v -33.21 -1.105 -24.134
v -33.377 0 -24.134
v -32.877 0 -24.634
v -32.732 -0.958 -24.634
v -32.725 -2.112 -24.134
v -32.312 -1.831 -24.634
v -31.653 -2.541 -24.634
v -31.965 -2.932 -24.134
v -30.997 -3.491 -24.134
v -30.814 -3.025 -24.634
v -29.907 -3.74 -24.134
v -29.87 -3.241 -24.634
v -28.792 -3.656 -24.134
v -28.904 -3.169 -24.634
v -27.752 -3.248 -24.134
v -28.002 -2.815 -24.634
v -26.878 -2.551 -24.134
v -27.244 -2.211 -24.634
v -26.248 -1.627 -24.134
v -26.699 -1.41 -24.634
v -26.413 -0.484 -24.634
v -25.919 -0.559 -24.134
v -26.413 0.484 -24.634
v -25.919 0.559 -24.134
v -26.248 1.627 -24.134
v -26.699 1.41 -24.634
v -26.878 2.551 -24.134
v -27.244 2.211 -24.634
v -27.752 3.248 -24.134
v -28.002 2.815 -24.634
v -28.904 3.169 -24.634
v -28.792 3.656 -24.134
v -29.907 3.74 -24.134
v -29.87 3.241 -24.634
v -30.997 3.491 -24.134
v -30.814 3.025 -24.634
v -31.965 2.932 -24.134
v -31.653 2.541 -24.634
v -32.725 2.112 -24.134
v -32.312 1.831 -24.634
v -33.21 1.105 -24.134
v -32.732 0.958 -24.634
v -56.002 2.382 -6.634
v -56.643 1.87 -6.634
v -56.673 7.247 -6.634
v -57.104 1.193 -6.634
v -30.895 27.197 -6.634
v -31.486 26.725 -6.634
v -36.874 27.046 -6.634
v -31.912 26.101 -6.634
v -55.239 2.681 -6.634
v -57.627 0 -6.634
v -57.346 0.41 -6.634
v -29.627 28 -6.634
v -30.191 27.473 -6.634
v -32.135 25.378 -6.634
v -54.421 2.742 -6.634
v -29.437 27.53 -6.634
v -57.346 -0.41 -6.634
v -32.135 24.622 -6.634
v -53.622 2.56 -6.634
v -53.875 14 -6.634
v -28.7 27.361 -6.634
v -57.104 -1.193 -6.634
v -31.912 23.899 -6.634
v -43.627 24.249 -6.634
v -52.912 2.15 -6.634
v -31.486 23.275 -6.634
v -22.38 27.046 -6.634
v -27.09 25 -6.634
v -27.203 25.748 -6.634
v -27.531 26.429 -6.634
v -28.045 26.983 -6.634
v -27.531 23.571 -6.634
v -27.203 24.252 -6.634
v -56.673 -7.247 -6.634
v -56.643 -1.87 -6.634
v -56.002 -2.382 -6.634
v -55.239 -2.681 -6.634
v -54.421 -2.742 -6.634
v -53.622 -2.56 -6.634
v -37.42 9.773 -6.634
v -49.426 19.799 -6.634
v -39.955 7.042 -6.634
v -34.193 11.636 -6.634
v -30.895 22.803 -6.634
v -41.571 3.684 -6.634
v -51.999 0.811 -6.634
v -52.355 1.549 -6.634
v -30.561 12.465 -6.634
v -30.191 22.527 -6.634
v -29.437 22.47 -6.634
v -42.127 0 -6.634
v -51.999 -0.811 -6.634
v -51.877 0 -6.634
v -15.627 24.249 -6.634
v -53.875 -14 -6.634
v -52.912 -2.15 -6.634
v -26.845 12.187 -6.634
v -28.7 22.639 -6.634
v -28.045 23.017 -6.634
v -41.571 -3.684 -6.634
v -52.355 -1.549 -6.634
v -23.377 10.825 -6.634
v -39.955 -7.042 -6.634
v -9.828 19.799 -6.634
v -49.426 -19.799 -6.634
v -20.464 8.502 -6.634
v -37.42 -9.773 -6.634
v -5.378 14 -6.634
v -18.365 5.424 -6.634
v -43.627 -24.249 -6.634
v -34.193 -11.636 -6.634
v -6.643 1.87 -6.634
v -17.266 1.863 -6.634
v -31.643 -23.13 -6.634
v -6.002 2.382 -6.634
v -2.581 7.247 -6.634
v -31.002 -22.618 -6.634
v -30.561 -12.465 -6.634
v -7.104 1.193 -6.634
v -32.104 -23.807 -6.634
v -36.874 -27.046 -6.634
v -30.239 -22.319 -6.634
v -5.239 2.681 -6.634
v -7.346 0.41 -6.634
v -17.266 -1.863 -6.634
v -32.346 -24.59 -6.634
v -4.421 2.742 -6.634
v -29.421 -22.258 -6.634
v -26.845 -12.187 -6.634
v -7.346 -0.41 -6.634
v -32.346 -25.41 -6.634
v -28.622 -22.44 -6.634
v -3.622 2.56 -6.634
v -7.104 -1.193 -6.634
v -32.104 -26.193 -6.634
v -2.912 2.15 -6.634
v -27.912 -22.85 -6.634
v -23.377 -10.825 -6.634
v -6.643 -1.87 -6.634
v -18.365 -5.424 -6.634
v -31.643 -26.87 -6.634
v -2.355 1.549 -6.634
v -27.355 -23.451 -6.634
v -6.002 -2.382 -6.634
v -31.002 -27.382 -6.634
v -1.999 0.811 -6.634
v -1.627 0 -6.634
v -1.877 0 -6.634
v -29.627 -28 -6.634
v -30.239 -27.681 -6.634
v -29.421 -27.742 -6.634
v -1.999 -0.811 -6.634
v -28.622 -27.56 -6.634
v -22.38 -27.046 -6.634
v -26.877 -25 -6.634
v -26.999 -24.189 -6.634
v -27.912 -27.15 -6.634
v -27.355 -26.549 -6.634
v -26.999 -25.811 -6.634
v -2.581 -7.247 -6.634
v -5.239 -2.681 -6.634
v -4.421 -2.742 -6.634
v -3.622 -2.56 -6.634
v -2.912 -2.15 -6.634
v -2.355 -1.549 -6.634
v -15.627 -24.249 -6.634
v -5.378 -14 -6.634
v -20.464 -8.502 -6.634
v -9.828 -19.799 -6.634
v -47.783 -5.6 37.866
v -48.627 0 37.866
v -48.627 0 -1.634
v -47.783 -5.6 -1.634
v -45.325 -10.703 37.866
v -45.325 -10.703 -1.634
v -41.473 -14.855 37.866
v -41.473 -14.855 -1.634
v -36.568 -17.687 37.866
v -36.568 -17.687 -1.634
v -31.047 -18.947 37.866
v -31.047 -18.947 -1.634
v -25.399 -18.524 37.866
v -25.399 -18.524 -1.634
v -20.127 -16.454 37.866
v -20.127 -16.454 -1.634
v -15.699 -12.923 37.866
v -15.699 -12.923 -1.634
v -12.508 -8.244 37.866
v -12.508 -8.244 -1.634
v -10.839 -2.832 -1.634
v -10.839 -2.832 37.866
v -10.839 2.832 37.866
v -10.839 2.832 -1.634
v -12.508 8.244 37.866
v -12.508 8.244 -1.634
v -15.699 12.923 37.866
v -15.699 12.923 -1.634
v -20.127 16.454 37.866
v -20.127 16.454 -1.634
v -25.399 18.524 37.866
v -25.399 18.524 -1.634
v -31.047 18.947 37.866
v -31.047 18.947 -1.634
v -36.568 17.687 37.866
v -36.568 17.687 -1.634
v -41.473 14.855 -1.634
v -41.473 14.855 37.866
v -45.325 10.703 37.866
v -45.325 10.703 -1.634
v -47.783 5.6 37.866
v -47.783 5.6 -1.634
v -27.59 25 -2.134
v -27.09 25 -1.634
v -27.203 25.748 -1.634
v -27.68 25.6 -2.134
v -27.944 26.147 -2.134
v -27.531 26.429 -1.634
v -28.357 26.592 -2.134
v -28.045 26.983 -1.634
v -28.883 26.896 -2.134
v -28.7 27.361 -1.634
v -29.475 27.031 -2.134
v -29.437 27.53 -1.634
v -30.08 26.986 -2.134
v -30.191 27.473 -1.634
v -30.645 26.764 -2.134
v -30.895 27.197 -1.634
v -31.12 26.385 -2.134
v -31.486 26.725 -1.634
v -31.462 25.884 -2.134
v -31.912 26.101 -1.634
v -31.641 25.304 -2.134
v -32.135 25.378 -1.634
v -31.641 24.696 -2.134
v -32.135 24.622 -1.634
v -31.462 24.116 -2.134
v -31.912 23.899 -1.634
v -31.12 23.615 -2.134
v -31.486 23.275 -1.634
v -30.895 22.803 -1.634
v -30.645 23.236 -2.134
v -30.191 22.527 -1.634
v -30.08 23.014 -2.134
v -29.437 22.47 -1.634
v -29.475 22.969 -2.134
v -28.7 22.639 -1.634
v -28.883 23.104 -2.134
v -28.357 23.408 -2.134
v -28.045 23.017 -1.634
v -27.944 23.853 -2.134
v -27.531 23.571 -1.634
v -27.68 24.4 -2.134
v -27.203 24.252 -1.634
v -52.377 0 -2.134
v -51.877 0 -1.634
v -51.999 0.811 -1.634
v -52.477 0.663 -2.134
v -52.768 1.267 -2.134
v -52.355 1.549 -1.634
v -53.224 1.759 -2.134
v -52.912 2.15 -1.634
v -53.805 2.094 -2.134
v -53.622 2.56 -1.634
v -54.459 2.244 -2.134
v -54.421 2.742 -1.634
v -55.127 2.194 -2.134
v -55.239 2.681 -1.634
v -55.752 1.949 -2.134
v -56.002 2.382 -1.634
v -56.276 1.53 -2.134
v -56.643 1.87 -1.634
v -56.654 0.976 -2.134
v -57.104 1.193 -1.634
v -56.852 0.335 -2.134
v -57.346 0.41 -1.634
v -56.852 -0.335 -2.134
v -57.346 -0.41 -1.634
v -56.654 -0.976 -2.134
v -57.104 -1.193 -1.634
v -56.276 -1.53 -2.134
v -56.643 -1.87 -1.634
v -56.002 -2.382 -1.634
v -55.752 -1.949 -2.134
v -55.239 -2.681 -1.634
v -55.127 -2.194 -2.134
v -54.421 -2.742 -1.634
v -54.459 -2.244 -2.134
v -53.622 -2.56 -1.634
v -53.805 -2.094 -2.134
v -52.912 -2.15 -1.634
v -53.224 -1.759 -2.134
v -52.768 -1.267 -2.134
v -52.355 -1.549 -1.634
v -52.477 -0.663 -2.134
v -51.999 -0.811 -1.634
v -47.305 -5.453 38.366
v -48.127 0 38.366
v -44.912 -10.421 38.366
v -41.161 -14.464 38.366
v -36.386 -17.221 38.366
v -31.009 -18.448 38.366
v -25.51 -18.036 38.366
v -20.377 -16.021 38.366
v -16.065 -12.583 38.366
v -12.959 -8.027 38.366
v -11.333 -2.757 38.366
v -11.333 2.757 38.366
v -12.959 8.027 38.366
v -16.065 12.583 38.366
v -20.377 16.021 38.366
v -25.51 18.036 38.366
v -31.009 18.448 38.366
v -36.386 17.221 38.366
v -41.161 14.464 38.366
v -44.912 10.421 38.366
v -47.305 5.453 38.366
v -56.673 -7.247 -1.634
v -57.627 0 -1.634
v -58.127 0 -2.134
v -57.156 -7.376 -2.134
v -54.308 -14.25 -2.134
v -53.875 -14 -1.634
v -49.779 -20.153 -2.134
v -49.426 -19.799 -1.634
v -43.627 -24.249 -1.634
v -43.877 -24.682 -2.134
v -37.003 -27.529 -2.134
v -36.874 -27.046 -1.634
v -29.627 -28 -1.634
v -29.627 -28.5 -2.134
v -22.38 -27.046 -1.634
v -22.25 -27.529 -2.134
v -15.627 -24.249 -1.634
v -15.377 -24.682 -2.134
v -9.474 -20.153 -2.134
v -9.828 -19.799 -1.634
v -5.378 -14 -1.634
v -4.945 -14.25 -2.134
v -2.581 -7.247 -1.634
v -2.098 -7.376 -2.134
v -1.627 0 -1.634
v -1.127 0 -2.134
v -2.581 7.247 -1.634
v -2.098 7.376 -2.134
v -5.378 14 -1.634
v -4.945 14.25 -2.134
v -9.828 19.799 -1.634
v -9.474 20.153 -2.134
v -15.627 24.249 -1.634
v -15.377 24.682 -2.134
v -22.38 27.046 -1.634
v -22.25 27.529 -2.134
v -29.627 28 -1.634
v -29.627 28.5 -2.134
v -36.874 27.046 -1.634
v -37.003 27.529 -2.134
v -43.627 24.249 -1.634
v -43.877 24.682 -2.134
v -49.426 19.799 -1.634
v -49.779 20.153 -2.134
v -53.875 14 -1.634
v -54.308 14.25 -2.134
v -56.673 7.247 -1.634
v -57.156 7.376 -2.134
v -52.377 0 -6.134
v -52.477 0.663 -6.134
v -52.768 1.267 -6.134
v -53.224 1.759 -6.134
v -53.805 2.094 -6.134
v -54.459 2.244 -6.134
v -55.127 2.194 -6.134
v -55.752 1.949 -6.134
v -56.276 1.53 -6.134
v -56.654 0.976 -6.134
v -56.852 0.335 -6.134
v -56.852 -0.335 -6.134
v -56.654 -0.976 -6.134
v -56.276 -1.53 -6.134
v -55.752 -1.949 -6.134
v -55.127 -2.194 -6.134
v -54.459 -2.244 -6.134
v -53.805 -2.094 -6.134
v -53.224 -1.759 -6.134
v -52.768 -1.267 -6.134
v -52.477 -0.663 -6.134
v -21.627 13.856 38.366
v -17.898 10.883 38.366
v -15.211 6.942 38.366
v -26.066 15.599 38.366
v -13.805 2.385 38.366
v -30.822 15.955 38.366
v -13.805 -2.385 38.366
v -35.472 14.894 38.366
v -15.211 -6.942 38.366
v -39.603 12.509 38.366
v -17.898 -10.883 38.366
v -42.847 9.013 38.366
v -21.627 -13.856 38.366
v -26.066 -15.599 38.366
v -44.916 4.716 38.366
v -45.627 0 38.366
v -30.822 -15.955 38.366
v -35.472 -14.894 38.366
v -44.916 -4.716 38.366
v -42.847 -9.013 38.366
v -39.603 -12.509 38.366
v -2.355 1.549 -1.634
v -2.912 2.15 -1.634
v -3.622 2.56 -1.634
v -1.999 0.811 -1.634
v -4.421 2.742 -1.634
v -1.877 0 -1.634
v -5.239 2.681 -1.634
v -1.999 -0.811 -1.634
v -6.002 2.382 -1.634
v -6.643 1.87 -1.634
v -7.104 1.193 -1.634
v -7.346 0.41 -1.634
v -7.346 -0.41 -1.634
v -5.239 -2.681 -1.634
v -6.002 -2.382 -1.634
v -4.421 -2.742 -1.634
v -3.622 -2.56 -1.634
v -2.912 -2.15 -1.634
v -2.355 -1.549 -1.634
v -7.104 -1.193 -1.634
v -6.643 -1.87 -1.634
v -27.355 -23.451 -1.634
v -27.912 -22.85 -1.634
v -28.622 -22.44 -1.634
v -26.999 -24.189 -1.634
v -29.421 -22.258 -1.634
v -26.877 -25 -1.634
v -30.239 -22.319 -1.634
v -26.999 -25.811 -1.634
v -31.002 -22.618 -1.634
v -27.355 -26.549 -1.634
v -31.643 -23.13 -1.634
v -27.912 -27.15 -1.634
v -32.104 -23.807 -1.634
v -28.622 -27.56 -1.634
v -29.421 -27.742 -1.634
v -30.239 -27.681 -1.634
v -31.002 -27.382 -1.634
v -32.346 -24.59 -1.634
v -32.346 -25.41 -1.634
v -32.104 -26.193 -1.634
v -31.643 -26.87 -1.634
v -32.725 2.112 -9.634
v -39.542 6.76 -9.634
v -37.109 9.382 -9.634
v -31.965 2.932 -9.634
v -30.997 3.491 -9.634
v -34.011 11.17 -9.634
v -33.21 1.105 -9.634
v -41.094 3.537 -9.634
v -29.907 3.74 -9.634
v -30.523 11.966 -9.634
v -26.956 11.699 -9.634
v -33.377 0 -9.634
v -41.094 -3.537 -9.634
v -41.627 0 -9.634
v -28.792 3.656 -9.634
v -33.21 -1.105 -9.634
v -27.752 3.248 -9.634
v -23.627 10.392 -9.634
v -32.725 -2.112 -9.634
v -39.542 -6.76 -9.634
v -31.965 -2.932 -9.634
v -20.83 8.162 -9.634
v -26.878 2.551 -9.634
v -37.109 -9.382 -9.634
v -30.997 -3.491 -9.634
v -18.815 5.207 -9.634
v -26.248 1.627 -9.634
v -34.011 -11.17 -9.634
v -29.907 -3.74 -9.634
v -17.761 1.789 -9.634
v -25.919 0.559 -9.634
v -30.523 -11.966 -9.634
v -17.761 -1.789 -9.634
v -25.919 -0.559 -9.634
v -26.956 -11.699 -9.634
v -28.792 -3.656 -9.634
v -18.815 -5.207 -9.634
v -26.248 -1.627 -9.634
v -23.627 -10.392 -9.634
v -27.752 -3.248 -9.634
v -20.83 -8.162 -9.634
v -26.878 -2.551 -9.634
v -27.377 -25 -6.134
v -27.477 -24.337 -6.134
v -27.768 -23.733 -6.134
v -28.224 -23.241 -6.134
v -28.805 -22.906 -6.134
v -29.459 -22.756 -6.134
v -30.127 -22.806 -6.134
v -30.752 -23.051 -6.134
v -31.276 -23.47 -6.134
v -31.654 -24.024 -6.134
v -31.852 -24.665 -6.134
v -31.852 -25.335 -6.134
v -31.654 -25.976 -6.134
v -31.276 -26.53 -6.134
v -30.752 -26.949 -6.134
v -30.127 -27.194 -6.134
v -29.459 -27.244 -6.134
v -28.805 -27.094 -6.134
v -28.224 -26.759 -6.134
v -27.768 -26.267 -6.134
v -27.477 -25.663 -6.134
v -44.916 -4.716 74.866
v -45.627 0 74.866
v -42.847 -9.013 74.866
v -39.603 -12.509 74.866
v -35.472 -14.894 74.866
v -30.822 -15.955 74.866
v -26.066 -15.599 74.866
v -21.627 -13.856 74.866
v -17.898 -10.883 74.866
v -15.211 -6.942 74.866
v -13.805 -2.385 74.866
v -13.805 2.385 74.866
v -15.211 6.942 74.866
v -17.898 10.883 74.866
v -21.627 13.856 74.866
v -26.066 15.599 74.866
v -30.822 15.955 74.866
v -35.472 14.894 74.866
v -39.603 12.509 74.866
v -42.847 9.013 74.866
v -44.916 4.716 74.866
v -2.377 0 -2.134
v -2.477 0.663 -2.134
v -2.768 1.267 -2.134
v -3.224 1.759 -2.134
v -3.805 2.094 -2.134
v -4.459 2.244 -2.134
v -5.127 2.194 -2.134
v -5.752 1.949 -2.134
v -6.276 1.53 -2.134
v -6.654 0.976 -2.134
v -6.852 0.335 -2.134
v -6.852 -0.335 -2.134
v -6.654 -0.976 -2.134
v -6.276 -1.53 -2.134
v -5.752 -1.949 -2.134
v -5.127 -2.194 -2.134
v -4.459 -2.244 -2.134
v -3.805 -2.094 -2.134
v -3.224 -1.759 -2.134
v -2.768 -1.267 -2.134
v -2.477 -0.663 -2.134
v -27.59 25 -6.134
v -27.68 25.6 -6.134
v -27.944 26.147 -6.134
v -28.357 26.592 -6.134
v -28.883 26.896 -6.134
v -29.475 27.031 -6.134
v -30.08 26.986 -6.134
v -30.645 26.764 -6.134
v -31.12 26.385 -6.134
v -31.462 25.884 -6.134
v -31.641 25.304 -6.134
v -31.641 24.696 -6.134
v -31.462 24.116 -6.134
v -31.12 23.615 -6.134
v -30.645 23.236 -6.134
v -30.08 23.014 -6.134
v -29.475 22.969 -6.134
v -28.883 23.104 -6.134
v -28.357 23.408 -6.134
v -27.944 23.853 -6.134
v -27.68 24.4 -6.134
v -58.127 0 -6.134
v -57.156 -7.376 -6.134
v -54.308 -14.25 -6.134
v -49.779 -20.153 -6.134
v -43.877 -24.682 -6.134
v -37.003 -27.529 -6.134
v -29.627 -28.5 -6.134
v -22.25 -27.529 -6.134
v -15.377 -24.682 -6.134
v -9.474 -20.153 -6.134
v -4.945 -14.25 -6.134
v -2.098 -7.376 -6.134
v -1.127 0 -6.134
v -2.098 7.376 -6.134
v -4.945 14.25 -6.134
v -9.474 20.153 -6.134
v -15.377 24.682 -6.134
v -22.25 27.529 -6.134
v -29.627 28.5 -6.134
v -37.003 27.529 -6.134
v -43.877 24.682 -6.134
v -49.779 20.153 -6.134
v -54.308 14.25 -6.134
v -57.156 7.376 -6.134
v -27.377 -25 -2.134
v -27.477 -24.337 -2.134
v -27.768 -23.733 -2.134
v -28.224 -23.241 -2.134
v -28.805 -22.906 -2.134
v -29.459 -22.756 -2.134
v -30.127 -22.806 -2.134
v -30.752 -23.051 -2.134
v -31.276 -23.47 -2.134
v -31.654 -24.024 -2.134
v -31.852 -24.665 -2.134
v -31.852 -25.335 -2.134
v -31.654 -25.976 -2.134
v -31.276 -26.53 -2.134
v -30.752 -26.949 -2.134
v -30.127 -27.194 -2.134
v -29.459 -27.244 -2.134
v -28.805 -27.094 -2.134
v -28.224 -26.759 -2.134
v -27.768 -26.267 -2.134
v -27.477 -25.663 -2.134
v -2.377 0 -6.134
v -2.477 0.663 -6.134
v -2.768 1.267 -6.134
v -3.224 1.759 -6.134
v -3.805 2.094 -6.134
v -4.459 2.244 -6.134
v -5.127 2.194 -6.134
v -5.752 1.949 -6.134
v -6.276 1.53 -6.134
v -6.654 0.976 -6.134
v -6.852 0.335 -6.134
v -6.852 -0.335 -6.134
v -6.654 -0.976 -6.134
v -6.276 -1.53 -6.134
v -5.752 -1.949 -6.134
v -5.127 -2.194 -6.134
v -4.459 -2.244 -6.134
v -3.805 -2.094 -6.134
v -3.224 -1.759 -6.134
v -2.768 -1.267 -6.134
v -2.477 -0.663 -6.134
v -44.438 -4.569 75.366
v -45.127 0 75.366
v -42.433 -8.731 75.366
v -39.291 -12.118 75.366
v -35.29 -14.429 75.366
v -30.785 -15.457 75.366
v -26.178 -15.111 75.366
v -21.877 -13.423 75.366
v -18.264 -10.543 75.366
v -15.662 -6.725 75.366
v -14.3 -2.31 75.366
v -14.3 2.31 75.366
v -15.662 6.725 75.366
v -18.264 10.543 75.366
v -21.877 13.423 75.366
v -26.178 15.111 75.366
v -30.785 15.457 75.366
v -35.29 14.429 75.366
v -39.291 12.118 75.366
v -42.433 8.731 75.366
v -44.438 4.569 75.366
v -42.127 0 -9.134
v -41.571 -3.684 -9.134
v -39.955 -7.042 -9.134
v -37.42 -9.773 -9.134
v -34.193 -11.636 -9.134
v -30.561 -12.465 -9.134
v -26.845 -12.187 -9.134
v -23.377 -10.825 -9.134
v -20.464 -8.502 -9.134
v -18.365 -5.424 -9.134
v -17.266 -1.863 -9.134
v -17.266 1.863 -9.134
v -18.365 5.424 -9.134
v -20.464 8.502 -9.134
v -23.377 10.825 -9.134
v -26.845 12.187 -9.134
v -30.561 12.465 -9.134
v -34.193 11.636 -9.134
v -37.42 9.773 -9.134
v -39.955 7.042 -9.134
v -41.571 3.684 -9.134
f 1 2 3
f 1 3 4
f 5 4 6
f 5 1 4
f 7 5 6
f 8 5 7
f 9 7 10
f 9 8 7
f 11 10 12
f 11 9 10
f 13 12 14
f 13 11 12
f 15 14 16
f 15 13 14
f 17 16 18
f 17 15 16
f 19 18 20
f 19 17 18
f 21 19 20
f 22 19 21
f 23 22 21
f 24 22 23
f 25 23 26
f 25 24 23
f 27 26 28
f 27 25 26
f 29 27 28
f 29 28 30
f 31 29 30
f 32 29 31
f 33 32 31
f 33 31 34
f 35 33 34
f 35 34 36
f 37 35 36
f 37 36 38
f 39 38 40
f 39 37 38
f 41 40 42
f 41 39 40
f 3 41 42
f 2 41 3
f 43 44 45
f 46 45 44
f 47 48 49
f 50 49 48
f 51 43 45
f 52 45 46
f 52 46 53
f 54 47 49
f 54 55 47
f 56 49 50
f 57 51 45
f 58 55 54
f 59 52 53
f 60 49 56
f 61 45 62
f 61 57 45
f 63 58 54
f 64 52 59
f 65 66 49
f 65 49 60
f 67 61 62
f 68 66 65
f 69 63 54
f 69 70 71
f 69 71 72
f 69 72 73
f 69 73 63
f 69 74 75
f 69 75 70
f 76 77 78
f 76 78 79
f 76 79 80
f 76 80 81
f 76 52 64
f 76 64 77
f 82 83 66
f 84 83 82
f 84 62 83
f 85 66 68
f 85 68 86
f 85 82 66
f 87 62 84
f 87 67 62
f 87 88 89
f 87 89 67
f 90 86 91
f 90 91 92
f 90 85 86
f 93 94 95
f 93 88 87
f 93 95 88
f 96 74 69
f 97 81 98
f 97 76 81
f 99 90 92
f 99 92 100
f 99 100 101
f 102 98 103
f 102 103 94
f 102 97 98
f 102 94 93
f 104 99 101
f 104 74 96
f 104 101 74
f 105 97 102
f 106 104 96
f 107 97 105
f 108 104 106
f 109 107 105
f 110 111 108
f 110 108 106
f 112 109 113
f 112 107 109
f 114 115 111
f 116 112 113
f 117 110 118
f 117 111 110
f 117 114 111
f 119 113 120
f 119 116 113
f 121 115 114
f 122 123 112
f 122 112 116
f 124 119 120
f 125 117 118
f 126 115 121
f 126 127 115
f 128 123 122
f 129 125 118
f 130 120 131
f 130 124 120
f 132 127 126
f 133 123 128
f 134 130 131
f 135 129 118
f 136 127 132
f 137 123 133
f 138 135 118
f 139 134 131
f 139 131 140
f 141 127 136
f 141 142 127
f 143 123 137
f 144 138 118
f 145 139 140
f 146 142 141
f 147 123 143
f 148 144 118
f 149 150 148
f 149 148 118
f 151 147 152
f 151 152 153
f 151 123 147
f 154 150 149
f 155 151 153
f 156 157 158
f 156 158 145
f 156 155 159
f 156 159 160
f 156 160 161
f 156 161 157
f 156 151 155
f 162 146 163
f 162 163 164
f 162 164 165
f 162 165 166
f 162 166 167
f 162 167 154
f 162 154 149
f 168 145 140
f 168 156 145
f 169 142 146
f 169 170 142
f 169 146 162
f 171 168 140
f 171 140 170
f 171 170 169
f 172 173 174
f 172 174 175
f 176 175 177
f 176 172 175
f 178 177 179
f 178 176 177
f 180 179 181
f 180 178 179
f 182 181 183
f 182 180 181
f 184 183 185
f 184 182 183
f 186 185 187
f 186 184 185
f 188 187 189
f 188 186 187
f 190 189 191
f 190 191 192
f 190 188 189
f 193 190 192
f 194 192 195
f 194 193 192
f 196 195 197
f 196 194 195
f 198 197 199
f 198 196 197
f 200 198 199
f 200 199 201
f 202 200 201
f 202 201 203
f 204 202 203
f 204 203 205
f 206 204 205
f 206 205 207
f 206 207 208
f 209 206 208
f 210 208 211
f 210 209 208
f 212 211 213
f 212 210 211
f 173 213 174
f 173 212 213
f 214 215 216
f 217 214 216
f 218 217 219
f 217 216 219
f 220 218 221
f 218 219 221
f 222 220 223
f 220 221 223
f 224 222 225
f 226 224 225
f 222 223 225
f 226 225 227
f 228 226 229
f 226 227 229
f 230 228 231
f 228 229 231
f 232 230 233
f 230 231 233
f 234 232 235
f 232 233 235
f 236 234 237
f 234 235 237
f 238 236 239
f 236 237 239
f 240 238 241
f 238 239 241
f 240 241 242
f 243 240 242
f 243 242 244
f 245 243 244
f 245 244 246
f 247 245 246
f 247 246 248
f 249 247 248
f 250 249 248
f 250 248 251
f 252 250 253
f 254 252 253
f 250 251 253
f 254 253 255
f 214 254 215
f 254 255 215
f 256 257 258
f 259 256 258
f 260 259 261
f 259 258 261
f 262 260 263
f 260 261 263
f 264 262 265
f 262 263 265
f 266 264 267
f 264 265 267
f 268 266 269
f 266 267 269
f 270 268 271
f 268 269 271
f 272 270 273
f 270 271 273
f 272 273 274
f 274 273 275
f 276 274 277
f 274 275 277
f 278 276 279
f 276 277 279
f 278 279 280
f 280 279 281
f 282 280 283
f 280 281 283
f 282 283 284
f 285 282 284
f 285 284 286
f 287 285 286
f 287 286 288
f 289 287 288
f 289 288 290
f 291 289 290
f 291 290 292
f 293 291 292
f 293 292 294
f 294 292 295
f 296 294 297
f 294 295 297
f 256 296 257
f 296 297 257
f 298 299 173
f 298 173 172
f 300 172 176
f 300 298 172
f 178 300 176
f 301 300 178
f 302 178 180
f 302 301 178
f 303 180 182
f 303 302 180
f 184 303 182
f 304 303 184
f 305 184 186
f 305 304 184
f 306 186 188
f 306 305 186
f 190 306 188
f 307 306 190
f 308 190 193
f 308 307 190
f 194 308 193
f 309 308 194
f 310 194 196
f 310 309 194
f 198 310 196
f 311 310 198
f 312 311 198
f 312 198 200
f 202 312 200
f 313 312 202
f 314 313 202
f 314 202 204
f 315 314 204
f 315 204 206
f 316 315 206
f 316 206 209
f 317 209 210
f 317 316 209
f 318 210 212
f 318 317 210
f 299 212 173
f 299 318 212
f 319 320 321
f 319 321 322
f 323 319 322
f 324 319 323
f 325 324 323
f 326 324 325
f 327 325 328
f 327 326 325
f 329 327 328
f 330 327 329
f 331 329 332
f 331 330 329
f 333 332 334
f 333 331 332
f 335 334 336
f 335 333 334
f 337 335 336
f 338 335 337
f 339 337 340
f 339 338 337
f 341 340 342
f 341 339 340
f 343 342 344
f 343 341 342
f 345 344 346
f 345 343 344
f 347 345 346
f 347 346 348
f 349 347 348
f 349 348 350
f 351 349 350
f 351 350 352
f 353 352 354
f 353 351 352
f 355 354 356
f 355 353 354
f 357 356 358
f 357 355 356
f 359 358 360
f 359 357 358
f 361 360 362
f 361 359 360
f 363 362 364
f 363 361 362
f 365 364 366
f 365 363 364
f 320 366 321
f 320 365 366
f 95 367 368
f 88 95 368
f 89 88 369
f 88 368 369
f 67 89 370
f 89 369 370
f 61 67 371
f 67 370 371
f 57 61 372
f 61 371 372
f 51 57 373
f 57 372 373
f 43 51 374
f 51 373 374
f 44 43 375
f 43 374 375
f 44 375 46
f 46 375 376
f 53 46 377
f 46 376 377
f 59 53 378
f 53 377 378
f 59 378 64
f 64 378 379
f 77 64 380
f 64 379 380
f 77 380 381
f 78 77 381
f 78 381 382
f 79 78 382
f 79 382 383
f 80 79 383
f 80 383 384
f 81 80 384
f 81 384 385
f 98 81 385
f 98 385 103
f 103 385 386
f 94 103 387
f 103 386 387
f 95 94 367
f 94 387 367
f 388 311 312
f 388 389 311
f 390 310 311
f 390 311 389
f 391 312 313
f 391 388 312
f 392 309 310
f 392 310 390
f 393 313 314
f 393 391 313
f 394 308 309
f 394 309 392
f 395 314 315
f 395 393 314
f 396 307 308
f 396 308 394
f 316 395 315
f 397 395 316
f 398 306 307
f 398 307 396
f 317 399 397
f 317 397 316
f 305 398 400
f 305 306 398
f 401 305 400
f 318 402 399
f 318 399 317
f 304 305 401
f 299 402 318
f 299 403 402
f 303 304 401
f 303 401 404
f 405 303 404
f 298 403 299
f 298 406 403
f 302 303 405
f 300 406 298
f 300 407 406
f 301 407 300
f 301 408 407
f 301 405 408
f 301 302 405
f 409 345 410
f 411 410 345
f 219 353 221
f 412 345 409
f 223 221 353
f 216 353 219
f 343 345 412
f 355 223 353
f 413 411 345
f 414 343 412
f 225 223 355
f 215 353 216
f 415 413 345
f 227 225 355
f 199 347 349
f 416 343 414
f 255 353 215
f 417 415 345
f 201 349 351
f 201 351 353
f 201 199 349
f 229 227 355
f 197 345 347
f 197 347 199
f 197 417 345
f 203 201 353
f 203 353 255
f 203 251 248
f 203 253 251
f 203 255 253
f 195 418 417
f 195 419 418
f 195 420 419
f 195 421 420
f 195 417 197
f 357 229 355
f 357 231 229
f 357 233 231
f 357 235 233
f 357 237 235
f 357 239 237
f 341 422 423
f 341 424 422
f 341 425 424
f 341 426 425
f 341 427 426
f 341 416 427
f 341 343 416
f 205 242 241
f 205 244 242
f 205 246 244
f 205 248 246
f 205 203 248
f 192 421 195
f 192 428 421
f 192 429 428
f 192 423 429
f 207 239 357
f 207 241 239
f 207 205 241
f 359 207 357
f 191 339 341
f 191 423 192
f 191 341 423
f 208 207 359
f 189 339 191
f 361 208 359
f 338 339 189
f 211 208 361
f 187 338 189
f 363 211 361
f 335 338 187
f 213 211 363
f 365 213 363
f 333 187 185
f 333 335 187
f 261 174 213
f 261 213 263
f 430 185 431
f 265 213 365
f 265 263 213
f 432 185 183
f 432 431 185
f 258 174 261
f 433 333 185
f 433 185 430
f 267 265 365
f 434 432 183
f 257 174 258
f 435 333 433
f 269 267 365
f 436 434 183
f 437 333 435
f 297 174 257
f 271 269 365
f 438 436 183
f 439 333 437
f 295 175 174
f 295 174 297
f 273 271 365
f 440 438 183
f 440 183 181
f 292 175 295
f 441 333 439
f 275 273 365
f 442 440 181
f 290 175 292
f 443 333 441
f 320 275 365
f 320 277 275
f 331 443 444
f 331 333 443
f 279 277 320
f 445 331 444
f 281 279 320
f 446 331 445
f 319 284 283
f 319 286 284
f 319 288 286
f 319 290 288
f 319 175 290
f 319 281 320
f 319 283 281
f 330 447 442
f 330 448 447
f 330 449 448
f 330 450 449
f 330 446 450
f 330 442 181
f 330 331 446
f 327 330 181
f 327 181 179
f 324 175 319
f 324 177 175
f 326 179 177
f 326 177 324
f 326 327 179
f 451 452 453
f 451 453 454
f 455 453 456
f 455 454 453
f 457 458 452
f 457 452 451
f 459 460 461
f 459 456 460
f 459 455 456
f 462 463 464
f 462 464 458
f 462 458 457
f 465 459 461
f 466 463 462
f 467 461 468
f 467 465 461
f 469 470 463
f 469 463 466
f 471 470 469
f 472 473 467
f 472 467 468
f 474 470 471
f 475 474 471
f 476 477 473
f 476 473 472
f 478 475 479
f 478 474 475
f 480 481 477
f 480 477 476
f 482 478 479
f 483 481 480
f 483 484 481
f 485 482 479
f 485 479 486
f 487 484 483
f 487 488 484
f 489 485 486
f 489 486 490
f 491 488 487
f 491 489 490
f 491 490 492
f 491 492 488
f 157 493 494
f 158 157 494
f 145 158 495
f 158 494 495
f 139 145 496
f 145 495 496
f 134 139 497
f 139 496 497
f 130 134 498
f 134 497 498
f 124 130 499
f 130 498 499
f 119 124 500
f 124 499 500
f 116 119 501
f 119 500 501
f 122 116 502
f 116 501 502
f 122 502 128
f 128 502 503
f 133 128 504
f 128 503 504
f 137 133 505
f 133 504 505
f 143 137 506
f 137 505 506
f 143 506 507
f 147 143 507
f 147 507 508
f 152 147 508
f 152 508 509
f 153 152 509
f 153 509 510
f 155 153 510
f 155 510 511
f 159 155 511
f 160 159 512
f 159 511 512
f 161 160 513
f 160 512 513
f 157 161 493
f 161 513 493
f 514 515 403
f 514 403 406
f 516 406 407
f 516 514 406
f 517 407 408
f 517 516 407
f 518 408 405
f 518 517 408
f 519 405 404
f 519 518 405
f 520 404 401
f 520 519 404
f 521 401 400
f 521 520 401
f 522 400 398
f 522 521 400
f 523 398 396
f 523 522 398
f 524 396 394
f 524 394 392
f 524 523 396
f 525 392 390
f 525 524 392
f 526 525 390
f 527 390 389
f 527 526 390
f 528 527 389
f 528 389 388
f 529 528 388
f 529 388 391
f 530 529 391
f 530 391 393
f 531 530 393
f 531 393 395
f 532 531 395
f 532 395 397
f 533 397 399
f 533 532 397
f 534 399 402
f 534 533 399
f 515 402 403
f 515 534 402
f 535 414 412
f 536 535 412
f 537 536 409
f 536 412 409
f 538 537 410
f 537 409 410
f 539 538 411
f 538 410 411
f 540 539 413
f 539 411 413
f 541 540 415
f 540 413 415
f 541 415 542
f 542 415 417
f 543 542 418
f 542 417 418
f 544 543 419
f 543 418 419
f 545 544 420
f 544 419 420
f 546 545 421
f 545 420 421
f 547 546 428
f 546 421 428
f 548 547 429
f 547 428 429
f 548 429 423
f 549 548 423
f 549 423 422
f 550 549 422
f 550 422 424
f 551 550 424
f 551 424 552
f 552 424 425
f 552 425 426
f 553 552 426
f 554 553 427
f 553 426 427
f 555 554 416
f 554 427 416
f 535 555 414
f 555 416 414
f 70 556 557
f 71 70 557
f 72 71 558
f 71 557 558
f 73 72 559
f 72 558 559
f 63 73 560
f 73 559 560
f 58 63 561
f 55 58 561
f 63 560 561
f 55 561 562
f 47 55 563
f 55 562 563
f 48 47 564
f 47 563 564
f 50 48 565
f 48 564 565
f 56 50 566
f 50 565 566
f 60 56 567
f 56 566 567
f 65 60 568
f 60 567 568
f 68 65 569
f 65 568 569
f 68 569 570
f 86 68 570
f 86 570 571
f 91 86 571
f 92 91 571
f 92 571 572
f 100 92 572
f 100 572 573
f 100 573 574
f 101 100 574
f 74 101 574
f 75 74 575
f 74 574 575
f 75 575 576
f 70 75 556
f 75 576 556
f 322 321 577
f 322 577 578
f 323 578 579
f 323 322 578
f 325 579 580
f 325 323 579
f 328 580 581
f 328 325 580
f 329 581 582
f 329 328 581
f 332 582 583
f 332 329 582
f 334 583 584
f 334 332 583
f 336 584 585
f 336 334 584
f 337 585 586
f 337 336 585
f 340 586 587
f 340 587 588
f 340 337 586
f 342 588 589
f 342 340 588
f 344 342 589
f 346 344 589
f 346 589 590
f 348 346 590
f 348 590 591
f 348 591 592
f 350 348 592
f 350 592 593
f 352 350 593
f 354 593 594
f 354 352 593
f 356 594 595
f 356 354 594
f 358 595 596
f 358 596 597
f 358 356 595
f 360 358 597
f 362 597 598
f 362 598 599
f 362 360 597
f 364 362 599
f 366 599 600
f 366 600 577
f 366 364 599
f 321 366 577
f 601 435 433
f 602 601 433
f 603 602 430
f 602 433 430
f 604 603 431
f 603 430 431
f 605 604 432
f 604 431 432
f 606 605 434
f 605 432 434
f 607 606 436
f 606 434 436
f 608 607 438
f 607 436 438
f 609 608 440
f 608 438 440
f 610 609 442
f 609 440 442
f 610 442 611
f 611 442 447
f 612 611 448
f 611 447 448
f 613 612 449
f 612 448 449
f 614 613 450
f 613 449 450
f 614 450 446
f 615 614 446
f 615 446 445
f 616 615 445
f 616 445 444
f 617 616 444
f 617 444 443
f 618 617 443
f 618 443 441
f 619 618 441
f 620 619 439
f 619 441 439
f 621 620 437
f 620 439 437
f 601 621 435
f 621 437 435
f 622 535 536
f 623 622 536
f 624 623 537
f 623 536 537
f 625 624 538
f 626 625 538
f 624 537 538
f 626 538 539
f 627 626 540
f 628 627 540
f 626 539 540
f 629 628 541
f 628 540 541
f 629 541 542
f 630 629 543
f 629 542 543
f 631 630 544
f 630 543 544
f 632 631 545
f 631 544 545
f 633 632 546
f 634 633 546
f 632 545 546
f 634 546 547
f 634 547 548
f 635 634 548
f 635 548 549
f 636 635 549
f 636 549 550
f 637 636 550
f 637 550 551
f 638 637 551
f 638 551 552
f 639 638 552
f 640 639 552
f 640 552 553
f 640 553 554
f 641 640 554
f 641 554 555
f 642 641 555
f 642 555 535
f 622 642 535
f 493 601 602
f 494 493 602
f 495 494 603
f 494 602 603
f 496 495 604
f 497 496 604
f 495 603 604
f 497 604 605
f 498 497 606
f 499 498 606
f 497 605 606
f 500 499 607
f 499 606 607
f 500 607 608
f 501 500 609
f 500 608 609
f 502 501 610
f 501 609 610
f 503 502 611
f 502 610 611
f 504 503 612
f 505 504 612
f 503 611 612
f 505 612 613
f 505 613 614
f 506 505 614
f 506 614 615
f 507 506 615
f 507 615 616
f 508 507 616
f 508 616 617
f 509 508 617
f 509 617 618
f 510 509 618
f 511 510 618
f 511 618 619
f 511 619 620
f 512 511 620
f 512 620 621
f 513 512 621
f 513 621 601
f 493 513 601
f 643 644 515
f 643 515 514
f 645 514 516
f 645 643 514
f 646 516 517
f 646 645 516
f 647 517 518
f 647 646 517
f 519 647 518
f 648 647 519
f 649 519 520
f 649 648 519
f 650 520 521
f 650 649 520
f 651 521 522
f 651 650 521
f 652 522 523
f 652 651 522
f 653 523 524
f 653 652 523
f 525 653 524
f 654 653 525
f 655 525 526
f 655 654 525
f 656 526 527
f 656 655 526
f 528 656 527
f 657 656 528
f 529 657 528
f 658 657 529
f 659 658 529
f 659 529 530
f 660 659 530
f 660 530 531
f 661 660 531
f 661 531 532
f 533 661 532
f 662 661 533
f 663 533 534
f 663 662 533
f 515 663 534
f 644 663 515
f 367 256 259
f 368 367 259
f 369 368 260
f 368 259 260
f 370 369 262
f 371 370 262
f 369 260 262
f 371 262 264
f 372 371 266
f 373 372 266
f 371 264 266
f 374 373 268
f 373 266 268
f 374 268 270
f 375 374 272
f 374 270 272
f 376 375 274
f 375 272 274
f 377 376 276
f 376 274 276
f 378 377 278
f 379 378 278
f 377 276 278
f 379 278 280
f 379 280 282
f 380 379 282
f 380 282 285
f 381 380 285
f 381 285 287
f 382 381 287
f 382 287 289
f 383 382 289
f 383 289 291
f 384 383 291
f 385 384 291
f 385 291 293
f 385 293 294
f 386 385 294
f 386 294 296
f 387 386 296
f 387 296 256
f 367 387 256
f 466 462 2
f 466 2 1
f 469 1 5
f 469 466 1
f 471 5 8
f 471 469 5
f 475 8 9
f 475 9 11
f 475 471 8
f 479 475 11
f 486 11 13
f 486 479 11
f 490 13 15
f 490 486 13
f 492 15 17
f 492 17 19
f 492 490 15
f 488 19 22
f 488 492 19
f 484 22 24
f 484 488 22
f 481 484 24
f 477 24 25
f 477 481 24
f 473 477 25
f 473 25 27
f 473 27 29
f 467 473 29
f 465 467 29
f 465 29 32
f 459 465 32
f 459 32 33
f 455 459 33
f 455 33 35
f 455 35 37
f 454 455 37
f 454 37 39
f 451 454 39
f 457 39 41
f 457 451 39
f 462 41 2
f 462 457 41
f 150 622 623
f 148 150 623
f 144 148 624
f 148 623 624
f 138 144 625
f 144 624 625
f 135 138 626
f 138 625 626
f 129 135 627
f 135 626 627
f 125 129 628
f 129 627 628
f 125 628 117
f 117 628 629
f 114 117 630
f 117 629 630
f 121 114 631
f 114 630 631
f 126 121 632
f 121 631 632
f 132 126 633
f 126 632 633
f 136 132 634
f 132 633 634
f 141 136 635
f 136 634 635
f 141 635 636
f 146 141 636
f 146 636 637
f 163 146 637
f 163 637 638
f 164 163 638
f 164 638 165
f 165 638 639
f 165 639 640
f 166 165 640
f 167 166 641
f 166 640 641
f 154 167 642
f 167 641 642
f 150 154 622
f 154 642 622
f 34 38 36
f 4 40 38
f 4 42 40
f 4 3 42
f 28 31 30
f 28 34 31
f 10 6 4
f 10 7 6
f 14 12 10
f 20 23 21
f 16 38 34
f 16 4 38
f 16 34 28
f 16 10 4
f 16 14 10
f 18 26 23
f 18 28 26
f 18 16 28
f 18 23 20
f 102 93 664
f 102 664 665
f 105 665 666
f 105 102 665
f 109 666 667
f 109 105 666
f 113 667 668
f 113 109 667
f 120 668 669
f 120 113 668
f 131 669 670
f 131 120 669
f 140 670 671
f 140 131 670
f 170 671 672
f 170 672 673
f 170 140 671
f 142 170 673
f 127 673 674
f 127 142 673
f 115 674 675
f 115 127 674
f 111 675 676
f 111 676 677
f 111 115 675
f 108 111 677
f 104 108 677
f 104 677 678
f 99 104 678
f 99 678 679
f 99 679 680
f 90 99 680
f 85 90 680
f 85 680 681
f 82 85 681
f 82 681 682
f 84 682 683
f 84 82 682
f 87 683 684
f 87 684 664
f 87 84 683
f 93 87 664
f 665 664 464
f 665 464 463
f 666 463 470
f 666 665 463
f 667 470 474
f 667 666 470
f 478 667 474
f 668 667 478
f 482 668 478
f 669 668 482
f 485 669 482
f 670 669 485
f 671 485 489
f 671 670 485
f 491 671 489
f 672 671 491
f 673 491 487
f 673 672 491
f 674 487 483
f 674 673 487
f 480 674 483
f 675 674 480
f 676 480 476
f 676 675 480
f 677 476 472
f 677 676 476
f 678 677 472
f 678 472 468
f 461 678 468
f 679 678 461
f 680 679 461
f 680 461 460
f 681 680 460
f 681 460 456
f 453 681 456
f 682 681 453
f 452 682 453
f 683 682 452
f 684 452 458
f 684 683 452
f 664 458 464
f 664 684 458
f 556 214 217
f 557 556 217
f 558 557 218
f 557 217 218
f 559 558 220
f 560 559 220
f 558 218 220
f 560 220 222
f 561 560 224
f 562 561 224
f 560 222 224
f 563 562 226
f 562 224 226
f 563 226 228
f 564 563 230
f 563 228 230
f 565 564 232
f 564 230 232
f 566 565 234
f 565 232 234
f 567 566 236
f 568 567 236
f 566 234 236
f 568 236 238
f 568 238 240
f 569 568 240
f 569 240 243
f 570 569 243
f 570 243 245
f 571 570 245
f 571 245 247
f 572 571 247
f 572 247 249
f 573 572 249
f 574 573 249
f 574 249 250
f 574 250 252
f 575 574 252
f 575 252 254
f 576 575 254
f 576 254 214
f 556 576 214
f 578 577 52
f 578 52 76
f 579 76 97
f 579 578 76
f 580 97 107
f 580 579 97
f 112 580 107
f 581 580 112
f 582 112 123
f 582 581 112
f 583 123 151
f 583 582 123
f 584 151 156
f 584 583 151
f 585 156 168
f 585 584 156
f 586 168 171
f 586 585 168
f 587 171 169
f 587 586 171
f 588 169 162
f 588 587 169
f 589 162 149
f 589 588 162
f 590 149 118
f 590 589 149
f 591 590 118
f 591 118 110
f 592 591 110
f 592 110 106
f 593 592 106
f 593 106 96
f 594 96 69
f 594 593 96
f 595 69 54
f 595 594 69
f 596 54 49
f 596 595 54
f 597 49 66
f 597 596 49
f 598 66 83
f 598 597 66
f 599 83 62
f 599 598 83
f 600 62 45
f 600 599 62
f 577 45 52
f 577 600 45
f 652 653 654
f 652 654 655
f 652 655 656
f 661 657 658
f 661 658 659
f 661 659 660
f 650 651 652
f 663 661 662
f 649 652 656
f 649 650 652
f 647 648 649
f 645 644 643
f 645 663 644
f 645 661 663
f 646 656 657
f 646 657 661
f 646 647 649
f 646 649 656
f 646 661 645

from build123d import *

# Parameters (mm, degrees)
SKETCH2_R          = 2.25
SKETCH2_R_2        = 2.036849222
CUT_EXTRUDE1_DEPTH = 10
CHAMFER1_SIZE      = 0.5
CHAMFER2_SIZE      = 0.5


with BuildPart() as part:
    # Sketch1 → Revolve1 (revolve)
    with BuildSketch(Plane(origin=(0, 0, 0), x_dir=(1, 0, 0), z_dir=(0, 1, 0))):
        Polygon((-29.626724138, 24.634482759), (-33.376724138, 24.634482759), (-33.376724138, 9.634482759), (-42.126724138, 9.634482759), (-42.126724138, 6.634482759), (-58.126724138, 6.634482759), (-58.126724138, 1.634482759), (-48.626724138, 1.634482759), (-48.626724138, -38.365517241), (-45.626724138, -38.365517241), (-45.626724138, -75.365517241), (-29.626724138, -75.365517241), align=None)
    revolve(axis=Axis((-29.626724138, 0, -29.85316092), (0, 0, 1)))

    # Sketch2 → Cut-Extrude1 (cut)
    with BuildSketch(Plane.XY.offset(-1.634482759)):
        with Locations((-4.626724138, 0)):
            Circle(SKETCH2_R)
        with Locations((-29.626724138, 25)):
            Circle(SKETCH2_R_2)
        with Locations((-54.626724138, 0)):
            Circle(SKETCH2_R)
        with Locations((-29.626724138, -25)):
            Circle(SKETCH2_R)
    extrude(amount=-CUT_EXTRUDE1_DEPTH, mode=Mode.SUBTRACT)

    # Chamfer1
    chamfer1_edges = [part.edges().sort_by_distance(p)[0] for p in [
        (-6.876724138, 0, -6.634482759),
        (-6.876724138, 0, -1.634482759),
        (-31.66357336, 25, -6.634482759),
        (-31.66357336, 25, -1.634482759),
        (-56.876724138, 0, -6.634482759),
        (-56.876724138, 0, -1.634482759),
        (-31.876724138, -25, -6.634482759),
        (-31.876724138, -25, -1.634482759),
        (-25.876724138, 0, -24.634482759),
        (-17.126724138, 0, -9.634482759),
        (-1.126724138, 0, -6.634482759),
        (-1.126724138, 0, -1.634482759),
    ]]
    chamfer(chamfer1_edges, length=CHAMFER1_SIZE)

    # Chamfer2
    chamfer2_edges = [part.edges().sort_by_distance(p)[0] for p in [
        (-10.626724138, 0, 38.365517241),
        (-13.626724138, 0, 75.365517241),
    ]]
    chamfer(chamfer2_edges, length=CHAMFER2_SIZE)


solid = part.part
